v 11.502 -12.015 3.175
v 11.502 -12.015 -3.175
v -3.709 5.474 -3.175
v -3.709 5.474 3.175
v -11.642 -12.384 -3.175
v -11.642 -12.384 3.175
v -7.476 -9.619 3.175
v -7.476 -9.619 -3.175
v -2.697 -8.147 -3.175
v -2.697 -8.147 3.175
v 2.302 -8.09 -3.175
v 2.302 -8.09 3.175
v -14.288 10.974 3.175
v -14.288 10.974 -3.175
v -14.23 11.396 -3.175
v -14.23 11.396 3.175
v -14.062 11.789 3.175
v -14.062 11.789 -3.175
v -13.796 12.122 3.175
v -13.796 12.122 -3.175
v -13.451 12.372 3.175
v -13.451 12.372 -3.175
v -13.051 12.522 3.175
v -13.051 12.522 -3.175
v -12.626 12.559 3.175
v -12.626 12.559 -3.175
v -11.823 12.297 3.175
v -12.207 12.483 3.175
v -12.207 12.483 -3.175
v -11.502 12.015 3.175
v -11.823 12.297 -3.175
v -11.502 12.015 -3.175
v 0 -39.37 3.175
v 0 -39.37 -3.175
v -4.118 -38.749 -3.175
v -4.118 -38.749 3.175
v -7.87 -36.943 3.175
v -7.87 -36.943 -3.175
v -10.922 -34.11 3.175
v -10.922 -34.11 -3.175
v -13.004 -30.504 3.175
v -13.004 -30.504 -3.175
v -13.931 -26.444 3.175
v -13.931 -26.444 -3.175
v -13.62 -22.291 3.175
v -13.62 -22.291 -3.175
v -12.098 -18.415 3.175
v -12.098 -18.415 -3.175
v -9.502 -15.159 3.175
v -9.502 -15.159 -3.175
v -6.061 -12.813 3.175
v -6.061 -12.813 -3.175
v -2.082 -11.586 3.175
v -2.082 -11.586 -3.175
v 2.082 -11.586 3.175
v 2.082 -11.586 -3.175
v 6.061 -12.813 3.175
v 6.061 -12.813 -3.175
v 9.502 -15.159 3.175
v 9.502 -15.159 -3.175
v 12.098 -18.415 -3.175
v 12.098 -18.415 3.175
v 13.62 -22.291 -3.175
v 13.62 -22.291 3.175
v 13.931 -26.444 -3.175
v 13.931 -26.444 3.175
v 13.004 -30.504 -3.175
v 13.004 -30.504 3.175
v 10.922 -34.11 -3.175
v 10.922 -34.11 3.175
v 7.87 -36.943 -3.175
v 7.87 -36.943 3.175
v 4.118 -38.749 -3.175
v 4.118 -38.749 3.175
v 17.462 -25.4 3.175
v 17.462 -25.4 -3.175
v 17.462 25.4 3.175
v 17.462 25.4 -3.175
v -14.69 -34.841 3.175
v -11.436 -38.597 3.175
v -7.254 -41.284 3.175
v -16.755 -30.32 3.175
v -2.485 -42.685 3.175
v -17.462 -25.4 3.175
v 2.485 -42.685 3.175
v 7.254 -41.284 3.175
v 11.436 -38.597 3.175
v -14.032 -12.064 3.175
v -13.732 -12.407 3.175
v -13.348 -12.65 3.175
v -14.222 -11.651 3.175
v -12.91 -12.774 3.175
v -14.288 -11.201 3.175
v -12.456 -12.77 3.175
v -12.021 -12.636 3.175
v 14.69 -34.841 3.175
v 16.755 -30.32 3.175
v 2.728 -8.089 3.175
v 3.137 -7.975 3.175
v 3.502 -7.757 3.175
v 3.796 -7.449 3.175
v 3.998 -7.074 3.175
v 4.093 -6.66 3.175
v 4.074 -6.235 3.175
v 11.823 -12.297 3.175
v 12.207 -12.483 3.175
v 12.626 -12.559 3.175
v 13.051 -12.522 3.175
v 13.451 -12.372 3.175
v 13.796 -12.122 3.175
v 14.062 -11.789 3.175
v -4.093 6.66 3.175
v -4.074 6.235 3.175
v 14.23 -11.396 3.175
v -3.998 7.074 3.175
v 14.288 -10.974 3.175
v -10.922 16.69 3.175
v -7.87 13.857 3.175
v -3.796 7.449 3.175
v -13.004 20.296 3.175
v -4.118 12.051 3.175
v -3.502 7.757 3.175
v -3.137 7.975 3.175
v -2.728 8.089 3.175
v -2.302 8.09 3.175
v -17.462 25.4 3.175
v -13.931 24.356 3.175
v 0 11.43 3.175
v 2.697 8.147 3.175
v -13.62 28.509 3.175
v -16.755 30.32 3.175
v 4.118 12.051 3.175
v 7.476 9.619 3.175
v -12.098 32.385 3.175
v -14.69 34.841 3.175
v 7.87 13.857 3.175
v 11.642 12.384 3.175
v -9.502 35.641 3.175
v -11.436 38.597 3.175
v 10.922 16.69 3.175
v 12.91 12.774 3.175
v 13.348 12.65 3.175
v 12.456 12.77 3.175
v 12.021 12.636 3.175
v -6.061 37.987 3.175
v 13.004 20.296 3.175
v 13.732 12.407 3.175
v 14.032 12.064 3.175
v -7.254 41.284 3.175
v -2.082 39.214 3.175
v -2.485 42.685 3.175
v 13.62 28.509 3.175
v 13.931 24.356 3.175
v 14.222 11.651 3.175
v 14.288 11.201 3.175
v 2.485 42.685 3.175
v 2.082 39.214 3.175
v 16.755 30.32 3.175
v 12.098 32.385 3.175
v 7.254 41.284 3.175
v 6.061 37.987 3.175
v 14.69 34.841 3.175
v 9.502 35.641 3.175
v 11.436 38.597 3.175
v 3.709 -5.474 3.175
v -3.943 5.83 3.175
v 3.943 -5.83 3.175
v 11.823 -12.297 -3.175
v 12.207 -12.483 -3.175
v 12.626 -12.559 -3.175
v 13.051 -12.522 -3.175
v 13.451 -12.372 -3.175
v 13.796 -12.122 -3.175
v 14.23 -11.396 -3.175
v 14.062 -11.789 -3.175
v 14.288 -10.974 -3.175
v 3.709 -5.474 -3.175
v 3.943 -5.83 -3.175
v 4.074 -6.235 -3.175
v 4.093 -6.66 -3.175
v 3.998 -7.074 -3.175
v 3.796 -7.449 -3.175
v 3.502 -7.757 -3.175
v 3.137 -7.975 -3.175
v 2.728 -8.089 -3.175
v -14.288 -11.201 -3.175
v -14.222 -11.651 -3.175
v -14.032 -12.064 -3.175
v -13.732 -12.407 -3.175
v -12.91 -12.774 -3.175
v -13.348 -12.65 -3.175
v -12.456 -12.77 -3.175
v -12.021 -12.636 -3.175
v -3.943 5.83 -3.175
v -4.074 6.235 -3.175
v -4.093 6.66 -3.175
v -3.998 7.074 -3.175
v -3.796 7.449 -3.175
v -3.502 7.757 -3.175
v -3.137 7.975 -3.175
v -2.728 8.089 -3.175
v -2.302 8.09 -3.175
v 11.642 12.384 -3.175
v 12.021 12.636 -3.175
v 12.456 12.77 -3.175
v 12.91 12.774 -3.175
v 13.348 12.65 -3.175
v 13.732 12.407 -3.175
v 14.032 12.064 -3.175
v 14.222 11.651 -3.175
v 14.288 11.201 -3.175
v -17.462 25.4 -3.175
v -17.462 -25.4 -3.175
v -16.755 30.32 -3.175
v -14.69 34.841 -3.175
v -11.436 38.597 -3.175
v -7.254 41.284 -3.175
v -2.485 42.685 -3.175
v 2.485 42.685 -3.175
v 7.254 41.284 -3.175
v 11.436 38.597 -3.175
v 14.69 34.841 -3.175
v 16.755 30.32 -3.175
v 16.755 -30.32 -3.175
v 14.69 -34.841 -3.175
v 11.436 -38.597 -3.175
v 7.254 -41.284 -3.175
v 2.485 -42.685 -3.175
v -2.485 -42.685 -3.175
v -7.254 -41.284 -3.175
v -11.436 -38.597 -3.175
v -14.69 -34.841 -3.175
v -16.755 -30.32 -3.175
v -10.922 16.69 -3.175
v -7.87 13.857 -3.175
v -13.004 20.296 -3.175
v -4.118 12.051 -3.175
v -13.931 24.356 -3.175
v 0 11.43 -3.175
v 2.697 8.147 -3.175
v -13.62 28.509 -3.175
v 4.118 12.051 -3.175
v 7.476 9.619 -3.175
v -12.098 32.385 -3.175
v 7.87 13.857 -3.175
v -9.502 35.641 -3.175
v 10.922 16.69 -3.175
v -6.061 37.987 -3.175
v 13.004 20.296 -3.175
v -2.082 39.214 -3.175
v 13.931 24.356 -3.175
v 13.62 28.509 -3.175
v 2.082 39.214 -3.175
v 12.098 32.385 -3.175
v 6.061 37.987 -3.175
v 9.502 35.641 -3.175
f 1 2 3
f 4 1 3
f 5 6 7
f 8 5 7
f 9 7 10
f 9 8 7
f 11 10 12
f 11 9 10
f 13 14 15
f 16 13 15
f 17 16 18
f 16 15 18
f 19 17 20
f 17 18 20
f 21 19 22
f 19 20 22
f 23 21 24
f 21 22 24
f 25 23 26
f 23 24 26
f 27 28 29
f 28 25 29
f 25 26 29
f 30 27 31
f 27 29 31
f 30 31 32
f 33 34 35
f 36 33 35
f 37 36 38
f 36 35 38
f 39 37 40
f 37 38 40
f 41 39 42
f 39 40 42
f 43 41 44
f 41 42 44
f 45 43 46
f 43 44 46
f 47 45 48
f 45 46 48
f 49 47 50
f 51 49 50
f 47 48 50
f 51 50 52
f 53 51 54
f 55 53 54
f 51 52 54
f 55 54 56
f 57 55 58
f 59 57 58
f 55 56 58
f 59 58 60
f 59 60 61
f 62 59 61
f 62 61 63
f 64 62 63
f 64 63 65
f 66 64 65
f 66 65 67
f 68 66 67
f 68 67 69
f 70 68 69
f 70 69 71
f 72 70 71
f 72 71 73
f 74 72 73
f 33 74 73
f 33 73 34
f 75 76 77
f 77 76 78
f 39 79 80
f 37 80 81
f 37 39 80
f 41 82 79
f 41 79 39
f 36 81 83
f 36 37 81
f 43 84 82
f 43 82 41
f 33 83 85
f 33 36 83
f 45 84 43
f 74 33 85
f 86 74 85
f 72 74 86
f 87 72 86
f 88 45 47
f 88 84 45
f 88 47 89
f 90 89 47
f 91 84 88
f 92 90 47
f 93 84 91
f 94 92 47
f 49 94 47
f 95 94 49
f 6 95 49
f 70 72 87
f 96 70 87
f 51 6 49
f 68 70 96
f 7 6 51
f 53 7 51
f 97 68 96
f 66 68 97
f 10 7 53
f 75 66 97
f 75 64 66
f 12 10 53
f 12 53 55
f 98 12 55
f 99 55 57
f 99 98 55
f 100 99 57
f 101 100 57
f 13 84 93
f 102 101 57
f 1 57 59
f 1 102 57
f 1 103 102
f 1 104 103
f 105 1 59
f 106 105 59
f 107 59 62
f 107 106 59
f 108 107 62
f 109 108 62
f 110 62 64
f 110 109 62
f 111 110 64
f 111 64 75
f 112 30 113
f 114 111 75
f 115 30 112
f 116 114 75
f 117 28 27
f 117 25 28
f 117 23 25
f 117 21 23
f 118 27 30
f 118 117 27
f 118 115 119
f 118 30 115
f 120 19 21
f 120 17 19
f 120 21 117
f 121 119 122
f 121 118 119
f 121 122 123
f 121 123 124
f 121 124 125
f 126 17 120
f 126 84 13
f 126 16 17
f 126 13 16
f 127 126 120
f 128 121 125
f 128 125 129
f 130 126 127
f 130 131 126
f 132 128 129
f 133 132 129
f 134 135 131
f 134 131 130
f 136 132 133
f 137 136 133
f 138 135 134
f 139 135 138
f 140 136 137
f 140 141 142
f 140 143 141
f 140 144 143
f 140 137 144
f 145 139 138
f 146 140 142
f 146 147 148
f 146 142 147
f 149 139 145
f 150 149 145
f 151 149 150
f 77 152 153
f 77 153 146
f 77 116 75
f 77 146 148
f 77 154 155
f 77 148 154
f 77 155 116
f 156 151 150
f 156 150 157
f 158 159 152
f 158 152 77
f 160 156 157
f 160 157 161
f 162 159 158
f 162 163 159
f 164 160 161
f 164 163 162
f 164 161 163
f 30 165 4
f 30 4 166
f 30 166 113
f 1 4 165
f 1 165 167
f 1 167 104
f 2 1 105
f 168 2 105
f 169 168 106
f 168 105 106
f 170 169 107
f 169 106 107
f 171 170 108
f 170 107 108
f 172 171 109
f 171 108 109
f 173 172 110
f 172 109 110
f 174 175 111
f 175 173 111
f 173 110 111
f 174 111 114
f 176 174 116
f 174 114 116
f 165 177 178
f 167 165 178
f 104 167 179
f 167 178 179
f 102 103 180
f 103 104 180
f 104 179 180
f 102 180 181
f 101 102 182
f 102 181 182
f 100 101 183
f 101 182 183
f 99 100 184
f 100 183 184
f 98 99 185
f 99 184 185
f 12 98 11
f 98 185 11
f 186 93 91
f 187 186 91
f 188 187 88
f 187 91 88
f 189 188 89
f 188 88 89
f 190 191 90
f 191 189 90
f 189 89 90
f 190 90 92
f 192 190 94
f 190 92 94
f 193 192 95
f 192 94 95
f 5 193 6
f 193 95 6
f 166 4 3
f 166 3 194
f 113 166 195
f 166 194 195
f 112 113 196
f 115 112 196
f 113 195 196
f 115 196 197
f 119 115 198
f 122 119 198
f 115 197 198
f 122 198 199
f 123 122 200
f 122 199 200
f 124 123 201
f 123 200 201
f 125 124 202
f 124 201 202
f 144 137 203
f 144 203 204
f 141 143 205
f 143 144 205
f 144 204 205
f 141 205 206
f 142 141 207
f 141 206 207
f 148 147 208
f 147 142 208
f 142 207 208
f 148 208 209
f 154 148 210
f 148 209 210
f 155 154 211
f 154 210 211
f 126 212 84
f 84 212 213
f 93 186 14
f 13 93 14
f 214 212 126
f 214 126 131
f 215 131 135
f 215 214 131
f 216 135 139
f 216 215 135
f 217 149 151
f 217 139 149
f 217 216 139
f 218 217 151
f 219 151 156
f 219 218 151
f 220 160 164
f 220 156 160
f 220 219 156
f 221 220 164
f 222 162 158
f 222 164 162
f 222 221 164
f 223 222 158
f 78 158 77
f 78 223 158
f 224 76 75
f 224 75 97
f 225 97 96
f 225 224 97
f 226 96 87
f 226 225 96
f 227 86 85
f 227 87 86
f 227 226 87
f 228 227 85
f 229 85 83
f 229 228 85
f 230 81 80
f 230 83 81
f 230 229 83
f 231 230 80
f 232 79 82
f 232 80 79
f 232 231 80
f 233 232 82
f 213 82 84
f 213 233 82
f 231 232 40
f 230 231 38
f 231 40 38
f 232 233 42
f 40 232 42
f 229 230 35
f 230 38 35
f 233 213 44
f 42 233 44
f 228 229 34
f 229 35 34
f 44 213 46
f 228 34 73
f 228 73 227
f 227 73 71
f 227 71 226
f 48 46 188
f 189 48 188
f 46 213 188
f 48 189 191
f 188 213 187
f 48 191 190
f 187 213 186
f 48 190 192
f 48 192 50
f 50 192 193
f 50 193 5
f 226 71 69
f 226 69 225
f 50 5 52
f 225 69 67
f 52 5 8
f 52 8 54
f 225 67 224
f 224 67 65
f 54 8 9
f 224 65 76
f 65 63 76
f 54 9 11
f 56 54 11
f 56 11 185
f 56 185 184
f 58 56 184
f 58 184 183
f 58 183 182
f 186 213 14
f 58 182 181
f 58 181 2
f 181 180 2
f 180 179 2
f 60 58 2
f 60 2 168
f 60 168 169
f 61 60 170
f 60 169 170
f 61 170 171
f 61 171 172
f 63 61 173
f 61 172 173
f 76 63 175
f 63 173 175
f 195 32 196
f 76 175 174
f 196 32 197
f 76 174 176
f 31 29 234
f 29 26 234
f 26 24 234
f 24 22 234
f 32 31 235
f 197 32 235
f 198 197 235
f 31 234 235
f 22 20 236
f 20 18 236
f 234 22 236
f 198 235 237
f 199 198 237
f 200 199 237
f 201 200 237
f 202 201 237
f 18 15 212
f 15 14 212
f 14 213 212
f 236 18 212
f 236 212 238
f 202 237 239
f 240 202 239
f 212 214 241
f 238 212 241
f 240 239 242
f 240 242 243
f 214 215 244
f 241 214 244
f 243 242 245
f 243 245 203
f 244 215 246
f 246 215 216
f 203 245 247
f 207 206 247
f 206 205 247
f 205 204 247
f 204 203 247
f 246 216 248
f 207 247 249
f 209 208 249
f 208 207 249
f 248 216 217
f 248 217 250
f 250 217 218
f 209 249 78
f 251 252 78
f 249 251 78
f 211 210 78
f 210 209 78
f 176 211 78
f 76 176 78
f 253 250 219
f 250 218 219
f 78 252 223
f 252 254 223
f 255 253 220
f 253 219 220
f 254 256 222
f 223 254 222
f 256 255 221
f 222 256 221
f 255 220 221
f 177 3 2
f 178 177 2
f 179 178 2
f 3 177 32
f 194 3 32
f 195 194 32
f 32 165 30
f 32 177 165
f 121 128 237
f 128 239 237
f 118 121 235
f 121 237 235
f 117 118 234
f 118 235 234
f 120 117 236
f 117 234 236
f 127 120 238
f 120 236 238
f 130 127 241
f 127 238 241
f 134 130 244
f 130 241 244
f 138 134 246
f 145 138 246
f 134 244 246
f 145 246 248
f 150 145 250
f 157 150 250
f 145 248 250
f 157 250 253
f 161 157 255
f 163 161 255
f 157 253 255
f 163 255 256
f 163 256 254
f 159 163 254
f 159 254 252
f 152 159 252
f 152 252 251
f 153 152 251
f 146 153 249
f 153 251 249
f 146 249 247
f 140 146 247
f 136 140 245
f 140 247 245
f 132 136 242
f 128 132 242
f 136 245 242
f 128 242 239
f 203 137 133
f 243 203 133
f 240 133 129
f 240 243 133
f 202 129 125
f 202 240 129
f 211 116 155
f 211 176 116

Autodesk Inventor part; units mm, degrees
ref_plane "YZ Plane" through (0, 0, 0) normal (1, 0, 0) x (0, 1, 0)
ref_plane "XZ Plane" through (0, 0, 0) normal (0, 1, 0) x (-1, 0, 0)
ref_plane "XY Plane" through (0, 0, 0) normal (0, 0, 1) x (1, 0, 0)
sketch "Sketch2" plane through (0, 0, 0) normal (0, 0, 1) x (1, 0, 0)
  line L0 (0, -25.4) -> (0, 25.4) construction
  line L1 (17.4625, -25.4) -> (17.4625, 25.4)
  line L2 (-17.4625, 25.4) -> (-17.4625, -25.4)
  circle A0 centre (0, -25.4) radius 14.2875 construction
  circle A1 centre (0, 25.4) radius 14.2875 construction
  line L3 (-14.2875, -15.3598) -> (-14.2875, 15.218)
  line L4 (7.2043, -9.4928) -> (-14.2875, 15.218)
  line L5 (14.2875, -15.218) -> (-7.2043, 9.4928)
  line L6 (14.2875, -15.218) -> (14.2875, 15.3598)
  arc A2 (-17.4625, -25.4) -> (17.4625, -25.4) centre (0, -25.4) ccw
  arc A3 (7.2043, -9.4928) -> (-14.2875, -15.3598) centre (0, -25.4) ccw
  arc A4 (17.4625, 25.4) -> (-17.4625, 25.4) centre (0, 25.4) ccw
  arc A5 (-7.2043, 9.4928) -> (14.2875, 15.3598) centre (0, 25.4) ccw
  point P0 (0, 0)
  dimension "d3" = 28.575
  dimension "d4" = 50.8
  dimension "d15" = 1.5875
  dimension "d16" = 17.4625
  dimension "d18" = 3.175
extrude "Extrusion1" add sketch "Sketch2" along normal mid plane 6.35
sketch "Sketch3" plane through (0, 0, 3.175) normal (0, 0, 1) x (1, 0, 0)
  arc A0 (-17.4625, -25.4) -> (17.4625, -25.4) centre (0, -25.4) ccw construction
  arc A1 (17.4625, 25.4) -> (-17.4625, 25.4) centre (0, 25.4) ccw construction
  point P0 (0, 0)
  point P1 (0, 25.4)
hole "Hole1" at (0, -25.4, 3.175) at (0, 25.4, 3.175) direction (0, 0, -1) diameter 27.94 end through all
fillet "Fillet1" radius 1.5875 6 edges at (14.2875, -15.218, 0) (7.2043, -9.4928, 0) (14.2875, 15.3598, 0) (-7.2043, 9.4928, 0) (-14.2875, -15.3598, 0) (-14.2875, 15.218, 0)
properties part number "BRACE,SHAFT,ELEVATOR" material "Aluminum 7075"
